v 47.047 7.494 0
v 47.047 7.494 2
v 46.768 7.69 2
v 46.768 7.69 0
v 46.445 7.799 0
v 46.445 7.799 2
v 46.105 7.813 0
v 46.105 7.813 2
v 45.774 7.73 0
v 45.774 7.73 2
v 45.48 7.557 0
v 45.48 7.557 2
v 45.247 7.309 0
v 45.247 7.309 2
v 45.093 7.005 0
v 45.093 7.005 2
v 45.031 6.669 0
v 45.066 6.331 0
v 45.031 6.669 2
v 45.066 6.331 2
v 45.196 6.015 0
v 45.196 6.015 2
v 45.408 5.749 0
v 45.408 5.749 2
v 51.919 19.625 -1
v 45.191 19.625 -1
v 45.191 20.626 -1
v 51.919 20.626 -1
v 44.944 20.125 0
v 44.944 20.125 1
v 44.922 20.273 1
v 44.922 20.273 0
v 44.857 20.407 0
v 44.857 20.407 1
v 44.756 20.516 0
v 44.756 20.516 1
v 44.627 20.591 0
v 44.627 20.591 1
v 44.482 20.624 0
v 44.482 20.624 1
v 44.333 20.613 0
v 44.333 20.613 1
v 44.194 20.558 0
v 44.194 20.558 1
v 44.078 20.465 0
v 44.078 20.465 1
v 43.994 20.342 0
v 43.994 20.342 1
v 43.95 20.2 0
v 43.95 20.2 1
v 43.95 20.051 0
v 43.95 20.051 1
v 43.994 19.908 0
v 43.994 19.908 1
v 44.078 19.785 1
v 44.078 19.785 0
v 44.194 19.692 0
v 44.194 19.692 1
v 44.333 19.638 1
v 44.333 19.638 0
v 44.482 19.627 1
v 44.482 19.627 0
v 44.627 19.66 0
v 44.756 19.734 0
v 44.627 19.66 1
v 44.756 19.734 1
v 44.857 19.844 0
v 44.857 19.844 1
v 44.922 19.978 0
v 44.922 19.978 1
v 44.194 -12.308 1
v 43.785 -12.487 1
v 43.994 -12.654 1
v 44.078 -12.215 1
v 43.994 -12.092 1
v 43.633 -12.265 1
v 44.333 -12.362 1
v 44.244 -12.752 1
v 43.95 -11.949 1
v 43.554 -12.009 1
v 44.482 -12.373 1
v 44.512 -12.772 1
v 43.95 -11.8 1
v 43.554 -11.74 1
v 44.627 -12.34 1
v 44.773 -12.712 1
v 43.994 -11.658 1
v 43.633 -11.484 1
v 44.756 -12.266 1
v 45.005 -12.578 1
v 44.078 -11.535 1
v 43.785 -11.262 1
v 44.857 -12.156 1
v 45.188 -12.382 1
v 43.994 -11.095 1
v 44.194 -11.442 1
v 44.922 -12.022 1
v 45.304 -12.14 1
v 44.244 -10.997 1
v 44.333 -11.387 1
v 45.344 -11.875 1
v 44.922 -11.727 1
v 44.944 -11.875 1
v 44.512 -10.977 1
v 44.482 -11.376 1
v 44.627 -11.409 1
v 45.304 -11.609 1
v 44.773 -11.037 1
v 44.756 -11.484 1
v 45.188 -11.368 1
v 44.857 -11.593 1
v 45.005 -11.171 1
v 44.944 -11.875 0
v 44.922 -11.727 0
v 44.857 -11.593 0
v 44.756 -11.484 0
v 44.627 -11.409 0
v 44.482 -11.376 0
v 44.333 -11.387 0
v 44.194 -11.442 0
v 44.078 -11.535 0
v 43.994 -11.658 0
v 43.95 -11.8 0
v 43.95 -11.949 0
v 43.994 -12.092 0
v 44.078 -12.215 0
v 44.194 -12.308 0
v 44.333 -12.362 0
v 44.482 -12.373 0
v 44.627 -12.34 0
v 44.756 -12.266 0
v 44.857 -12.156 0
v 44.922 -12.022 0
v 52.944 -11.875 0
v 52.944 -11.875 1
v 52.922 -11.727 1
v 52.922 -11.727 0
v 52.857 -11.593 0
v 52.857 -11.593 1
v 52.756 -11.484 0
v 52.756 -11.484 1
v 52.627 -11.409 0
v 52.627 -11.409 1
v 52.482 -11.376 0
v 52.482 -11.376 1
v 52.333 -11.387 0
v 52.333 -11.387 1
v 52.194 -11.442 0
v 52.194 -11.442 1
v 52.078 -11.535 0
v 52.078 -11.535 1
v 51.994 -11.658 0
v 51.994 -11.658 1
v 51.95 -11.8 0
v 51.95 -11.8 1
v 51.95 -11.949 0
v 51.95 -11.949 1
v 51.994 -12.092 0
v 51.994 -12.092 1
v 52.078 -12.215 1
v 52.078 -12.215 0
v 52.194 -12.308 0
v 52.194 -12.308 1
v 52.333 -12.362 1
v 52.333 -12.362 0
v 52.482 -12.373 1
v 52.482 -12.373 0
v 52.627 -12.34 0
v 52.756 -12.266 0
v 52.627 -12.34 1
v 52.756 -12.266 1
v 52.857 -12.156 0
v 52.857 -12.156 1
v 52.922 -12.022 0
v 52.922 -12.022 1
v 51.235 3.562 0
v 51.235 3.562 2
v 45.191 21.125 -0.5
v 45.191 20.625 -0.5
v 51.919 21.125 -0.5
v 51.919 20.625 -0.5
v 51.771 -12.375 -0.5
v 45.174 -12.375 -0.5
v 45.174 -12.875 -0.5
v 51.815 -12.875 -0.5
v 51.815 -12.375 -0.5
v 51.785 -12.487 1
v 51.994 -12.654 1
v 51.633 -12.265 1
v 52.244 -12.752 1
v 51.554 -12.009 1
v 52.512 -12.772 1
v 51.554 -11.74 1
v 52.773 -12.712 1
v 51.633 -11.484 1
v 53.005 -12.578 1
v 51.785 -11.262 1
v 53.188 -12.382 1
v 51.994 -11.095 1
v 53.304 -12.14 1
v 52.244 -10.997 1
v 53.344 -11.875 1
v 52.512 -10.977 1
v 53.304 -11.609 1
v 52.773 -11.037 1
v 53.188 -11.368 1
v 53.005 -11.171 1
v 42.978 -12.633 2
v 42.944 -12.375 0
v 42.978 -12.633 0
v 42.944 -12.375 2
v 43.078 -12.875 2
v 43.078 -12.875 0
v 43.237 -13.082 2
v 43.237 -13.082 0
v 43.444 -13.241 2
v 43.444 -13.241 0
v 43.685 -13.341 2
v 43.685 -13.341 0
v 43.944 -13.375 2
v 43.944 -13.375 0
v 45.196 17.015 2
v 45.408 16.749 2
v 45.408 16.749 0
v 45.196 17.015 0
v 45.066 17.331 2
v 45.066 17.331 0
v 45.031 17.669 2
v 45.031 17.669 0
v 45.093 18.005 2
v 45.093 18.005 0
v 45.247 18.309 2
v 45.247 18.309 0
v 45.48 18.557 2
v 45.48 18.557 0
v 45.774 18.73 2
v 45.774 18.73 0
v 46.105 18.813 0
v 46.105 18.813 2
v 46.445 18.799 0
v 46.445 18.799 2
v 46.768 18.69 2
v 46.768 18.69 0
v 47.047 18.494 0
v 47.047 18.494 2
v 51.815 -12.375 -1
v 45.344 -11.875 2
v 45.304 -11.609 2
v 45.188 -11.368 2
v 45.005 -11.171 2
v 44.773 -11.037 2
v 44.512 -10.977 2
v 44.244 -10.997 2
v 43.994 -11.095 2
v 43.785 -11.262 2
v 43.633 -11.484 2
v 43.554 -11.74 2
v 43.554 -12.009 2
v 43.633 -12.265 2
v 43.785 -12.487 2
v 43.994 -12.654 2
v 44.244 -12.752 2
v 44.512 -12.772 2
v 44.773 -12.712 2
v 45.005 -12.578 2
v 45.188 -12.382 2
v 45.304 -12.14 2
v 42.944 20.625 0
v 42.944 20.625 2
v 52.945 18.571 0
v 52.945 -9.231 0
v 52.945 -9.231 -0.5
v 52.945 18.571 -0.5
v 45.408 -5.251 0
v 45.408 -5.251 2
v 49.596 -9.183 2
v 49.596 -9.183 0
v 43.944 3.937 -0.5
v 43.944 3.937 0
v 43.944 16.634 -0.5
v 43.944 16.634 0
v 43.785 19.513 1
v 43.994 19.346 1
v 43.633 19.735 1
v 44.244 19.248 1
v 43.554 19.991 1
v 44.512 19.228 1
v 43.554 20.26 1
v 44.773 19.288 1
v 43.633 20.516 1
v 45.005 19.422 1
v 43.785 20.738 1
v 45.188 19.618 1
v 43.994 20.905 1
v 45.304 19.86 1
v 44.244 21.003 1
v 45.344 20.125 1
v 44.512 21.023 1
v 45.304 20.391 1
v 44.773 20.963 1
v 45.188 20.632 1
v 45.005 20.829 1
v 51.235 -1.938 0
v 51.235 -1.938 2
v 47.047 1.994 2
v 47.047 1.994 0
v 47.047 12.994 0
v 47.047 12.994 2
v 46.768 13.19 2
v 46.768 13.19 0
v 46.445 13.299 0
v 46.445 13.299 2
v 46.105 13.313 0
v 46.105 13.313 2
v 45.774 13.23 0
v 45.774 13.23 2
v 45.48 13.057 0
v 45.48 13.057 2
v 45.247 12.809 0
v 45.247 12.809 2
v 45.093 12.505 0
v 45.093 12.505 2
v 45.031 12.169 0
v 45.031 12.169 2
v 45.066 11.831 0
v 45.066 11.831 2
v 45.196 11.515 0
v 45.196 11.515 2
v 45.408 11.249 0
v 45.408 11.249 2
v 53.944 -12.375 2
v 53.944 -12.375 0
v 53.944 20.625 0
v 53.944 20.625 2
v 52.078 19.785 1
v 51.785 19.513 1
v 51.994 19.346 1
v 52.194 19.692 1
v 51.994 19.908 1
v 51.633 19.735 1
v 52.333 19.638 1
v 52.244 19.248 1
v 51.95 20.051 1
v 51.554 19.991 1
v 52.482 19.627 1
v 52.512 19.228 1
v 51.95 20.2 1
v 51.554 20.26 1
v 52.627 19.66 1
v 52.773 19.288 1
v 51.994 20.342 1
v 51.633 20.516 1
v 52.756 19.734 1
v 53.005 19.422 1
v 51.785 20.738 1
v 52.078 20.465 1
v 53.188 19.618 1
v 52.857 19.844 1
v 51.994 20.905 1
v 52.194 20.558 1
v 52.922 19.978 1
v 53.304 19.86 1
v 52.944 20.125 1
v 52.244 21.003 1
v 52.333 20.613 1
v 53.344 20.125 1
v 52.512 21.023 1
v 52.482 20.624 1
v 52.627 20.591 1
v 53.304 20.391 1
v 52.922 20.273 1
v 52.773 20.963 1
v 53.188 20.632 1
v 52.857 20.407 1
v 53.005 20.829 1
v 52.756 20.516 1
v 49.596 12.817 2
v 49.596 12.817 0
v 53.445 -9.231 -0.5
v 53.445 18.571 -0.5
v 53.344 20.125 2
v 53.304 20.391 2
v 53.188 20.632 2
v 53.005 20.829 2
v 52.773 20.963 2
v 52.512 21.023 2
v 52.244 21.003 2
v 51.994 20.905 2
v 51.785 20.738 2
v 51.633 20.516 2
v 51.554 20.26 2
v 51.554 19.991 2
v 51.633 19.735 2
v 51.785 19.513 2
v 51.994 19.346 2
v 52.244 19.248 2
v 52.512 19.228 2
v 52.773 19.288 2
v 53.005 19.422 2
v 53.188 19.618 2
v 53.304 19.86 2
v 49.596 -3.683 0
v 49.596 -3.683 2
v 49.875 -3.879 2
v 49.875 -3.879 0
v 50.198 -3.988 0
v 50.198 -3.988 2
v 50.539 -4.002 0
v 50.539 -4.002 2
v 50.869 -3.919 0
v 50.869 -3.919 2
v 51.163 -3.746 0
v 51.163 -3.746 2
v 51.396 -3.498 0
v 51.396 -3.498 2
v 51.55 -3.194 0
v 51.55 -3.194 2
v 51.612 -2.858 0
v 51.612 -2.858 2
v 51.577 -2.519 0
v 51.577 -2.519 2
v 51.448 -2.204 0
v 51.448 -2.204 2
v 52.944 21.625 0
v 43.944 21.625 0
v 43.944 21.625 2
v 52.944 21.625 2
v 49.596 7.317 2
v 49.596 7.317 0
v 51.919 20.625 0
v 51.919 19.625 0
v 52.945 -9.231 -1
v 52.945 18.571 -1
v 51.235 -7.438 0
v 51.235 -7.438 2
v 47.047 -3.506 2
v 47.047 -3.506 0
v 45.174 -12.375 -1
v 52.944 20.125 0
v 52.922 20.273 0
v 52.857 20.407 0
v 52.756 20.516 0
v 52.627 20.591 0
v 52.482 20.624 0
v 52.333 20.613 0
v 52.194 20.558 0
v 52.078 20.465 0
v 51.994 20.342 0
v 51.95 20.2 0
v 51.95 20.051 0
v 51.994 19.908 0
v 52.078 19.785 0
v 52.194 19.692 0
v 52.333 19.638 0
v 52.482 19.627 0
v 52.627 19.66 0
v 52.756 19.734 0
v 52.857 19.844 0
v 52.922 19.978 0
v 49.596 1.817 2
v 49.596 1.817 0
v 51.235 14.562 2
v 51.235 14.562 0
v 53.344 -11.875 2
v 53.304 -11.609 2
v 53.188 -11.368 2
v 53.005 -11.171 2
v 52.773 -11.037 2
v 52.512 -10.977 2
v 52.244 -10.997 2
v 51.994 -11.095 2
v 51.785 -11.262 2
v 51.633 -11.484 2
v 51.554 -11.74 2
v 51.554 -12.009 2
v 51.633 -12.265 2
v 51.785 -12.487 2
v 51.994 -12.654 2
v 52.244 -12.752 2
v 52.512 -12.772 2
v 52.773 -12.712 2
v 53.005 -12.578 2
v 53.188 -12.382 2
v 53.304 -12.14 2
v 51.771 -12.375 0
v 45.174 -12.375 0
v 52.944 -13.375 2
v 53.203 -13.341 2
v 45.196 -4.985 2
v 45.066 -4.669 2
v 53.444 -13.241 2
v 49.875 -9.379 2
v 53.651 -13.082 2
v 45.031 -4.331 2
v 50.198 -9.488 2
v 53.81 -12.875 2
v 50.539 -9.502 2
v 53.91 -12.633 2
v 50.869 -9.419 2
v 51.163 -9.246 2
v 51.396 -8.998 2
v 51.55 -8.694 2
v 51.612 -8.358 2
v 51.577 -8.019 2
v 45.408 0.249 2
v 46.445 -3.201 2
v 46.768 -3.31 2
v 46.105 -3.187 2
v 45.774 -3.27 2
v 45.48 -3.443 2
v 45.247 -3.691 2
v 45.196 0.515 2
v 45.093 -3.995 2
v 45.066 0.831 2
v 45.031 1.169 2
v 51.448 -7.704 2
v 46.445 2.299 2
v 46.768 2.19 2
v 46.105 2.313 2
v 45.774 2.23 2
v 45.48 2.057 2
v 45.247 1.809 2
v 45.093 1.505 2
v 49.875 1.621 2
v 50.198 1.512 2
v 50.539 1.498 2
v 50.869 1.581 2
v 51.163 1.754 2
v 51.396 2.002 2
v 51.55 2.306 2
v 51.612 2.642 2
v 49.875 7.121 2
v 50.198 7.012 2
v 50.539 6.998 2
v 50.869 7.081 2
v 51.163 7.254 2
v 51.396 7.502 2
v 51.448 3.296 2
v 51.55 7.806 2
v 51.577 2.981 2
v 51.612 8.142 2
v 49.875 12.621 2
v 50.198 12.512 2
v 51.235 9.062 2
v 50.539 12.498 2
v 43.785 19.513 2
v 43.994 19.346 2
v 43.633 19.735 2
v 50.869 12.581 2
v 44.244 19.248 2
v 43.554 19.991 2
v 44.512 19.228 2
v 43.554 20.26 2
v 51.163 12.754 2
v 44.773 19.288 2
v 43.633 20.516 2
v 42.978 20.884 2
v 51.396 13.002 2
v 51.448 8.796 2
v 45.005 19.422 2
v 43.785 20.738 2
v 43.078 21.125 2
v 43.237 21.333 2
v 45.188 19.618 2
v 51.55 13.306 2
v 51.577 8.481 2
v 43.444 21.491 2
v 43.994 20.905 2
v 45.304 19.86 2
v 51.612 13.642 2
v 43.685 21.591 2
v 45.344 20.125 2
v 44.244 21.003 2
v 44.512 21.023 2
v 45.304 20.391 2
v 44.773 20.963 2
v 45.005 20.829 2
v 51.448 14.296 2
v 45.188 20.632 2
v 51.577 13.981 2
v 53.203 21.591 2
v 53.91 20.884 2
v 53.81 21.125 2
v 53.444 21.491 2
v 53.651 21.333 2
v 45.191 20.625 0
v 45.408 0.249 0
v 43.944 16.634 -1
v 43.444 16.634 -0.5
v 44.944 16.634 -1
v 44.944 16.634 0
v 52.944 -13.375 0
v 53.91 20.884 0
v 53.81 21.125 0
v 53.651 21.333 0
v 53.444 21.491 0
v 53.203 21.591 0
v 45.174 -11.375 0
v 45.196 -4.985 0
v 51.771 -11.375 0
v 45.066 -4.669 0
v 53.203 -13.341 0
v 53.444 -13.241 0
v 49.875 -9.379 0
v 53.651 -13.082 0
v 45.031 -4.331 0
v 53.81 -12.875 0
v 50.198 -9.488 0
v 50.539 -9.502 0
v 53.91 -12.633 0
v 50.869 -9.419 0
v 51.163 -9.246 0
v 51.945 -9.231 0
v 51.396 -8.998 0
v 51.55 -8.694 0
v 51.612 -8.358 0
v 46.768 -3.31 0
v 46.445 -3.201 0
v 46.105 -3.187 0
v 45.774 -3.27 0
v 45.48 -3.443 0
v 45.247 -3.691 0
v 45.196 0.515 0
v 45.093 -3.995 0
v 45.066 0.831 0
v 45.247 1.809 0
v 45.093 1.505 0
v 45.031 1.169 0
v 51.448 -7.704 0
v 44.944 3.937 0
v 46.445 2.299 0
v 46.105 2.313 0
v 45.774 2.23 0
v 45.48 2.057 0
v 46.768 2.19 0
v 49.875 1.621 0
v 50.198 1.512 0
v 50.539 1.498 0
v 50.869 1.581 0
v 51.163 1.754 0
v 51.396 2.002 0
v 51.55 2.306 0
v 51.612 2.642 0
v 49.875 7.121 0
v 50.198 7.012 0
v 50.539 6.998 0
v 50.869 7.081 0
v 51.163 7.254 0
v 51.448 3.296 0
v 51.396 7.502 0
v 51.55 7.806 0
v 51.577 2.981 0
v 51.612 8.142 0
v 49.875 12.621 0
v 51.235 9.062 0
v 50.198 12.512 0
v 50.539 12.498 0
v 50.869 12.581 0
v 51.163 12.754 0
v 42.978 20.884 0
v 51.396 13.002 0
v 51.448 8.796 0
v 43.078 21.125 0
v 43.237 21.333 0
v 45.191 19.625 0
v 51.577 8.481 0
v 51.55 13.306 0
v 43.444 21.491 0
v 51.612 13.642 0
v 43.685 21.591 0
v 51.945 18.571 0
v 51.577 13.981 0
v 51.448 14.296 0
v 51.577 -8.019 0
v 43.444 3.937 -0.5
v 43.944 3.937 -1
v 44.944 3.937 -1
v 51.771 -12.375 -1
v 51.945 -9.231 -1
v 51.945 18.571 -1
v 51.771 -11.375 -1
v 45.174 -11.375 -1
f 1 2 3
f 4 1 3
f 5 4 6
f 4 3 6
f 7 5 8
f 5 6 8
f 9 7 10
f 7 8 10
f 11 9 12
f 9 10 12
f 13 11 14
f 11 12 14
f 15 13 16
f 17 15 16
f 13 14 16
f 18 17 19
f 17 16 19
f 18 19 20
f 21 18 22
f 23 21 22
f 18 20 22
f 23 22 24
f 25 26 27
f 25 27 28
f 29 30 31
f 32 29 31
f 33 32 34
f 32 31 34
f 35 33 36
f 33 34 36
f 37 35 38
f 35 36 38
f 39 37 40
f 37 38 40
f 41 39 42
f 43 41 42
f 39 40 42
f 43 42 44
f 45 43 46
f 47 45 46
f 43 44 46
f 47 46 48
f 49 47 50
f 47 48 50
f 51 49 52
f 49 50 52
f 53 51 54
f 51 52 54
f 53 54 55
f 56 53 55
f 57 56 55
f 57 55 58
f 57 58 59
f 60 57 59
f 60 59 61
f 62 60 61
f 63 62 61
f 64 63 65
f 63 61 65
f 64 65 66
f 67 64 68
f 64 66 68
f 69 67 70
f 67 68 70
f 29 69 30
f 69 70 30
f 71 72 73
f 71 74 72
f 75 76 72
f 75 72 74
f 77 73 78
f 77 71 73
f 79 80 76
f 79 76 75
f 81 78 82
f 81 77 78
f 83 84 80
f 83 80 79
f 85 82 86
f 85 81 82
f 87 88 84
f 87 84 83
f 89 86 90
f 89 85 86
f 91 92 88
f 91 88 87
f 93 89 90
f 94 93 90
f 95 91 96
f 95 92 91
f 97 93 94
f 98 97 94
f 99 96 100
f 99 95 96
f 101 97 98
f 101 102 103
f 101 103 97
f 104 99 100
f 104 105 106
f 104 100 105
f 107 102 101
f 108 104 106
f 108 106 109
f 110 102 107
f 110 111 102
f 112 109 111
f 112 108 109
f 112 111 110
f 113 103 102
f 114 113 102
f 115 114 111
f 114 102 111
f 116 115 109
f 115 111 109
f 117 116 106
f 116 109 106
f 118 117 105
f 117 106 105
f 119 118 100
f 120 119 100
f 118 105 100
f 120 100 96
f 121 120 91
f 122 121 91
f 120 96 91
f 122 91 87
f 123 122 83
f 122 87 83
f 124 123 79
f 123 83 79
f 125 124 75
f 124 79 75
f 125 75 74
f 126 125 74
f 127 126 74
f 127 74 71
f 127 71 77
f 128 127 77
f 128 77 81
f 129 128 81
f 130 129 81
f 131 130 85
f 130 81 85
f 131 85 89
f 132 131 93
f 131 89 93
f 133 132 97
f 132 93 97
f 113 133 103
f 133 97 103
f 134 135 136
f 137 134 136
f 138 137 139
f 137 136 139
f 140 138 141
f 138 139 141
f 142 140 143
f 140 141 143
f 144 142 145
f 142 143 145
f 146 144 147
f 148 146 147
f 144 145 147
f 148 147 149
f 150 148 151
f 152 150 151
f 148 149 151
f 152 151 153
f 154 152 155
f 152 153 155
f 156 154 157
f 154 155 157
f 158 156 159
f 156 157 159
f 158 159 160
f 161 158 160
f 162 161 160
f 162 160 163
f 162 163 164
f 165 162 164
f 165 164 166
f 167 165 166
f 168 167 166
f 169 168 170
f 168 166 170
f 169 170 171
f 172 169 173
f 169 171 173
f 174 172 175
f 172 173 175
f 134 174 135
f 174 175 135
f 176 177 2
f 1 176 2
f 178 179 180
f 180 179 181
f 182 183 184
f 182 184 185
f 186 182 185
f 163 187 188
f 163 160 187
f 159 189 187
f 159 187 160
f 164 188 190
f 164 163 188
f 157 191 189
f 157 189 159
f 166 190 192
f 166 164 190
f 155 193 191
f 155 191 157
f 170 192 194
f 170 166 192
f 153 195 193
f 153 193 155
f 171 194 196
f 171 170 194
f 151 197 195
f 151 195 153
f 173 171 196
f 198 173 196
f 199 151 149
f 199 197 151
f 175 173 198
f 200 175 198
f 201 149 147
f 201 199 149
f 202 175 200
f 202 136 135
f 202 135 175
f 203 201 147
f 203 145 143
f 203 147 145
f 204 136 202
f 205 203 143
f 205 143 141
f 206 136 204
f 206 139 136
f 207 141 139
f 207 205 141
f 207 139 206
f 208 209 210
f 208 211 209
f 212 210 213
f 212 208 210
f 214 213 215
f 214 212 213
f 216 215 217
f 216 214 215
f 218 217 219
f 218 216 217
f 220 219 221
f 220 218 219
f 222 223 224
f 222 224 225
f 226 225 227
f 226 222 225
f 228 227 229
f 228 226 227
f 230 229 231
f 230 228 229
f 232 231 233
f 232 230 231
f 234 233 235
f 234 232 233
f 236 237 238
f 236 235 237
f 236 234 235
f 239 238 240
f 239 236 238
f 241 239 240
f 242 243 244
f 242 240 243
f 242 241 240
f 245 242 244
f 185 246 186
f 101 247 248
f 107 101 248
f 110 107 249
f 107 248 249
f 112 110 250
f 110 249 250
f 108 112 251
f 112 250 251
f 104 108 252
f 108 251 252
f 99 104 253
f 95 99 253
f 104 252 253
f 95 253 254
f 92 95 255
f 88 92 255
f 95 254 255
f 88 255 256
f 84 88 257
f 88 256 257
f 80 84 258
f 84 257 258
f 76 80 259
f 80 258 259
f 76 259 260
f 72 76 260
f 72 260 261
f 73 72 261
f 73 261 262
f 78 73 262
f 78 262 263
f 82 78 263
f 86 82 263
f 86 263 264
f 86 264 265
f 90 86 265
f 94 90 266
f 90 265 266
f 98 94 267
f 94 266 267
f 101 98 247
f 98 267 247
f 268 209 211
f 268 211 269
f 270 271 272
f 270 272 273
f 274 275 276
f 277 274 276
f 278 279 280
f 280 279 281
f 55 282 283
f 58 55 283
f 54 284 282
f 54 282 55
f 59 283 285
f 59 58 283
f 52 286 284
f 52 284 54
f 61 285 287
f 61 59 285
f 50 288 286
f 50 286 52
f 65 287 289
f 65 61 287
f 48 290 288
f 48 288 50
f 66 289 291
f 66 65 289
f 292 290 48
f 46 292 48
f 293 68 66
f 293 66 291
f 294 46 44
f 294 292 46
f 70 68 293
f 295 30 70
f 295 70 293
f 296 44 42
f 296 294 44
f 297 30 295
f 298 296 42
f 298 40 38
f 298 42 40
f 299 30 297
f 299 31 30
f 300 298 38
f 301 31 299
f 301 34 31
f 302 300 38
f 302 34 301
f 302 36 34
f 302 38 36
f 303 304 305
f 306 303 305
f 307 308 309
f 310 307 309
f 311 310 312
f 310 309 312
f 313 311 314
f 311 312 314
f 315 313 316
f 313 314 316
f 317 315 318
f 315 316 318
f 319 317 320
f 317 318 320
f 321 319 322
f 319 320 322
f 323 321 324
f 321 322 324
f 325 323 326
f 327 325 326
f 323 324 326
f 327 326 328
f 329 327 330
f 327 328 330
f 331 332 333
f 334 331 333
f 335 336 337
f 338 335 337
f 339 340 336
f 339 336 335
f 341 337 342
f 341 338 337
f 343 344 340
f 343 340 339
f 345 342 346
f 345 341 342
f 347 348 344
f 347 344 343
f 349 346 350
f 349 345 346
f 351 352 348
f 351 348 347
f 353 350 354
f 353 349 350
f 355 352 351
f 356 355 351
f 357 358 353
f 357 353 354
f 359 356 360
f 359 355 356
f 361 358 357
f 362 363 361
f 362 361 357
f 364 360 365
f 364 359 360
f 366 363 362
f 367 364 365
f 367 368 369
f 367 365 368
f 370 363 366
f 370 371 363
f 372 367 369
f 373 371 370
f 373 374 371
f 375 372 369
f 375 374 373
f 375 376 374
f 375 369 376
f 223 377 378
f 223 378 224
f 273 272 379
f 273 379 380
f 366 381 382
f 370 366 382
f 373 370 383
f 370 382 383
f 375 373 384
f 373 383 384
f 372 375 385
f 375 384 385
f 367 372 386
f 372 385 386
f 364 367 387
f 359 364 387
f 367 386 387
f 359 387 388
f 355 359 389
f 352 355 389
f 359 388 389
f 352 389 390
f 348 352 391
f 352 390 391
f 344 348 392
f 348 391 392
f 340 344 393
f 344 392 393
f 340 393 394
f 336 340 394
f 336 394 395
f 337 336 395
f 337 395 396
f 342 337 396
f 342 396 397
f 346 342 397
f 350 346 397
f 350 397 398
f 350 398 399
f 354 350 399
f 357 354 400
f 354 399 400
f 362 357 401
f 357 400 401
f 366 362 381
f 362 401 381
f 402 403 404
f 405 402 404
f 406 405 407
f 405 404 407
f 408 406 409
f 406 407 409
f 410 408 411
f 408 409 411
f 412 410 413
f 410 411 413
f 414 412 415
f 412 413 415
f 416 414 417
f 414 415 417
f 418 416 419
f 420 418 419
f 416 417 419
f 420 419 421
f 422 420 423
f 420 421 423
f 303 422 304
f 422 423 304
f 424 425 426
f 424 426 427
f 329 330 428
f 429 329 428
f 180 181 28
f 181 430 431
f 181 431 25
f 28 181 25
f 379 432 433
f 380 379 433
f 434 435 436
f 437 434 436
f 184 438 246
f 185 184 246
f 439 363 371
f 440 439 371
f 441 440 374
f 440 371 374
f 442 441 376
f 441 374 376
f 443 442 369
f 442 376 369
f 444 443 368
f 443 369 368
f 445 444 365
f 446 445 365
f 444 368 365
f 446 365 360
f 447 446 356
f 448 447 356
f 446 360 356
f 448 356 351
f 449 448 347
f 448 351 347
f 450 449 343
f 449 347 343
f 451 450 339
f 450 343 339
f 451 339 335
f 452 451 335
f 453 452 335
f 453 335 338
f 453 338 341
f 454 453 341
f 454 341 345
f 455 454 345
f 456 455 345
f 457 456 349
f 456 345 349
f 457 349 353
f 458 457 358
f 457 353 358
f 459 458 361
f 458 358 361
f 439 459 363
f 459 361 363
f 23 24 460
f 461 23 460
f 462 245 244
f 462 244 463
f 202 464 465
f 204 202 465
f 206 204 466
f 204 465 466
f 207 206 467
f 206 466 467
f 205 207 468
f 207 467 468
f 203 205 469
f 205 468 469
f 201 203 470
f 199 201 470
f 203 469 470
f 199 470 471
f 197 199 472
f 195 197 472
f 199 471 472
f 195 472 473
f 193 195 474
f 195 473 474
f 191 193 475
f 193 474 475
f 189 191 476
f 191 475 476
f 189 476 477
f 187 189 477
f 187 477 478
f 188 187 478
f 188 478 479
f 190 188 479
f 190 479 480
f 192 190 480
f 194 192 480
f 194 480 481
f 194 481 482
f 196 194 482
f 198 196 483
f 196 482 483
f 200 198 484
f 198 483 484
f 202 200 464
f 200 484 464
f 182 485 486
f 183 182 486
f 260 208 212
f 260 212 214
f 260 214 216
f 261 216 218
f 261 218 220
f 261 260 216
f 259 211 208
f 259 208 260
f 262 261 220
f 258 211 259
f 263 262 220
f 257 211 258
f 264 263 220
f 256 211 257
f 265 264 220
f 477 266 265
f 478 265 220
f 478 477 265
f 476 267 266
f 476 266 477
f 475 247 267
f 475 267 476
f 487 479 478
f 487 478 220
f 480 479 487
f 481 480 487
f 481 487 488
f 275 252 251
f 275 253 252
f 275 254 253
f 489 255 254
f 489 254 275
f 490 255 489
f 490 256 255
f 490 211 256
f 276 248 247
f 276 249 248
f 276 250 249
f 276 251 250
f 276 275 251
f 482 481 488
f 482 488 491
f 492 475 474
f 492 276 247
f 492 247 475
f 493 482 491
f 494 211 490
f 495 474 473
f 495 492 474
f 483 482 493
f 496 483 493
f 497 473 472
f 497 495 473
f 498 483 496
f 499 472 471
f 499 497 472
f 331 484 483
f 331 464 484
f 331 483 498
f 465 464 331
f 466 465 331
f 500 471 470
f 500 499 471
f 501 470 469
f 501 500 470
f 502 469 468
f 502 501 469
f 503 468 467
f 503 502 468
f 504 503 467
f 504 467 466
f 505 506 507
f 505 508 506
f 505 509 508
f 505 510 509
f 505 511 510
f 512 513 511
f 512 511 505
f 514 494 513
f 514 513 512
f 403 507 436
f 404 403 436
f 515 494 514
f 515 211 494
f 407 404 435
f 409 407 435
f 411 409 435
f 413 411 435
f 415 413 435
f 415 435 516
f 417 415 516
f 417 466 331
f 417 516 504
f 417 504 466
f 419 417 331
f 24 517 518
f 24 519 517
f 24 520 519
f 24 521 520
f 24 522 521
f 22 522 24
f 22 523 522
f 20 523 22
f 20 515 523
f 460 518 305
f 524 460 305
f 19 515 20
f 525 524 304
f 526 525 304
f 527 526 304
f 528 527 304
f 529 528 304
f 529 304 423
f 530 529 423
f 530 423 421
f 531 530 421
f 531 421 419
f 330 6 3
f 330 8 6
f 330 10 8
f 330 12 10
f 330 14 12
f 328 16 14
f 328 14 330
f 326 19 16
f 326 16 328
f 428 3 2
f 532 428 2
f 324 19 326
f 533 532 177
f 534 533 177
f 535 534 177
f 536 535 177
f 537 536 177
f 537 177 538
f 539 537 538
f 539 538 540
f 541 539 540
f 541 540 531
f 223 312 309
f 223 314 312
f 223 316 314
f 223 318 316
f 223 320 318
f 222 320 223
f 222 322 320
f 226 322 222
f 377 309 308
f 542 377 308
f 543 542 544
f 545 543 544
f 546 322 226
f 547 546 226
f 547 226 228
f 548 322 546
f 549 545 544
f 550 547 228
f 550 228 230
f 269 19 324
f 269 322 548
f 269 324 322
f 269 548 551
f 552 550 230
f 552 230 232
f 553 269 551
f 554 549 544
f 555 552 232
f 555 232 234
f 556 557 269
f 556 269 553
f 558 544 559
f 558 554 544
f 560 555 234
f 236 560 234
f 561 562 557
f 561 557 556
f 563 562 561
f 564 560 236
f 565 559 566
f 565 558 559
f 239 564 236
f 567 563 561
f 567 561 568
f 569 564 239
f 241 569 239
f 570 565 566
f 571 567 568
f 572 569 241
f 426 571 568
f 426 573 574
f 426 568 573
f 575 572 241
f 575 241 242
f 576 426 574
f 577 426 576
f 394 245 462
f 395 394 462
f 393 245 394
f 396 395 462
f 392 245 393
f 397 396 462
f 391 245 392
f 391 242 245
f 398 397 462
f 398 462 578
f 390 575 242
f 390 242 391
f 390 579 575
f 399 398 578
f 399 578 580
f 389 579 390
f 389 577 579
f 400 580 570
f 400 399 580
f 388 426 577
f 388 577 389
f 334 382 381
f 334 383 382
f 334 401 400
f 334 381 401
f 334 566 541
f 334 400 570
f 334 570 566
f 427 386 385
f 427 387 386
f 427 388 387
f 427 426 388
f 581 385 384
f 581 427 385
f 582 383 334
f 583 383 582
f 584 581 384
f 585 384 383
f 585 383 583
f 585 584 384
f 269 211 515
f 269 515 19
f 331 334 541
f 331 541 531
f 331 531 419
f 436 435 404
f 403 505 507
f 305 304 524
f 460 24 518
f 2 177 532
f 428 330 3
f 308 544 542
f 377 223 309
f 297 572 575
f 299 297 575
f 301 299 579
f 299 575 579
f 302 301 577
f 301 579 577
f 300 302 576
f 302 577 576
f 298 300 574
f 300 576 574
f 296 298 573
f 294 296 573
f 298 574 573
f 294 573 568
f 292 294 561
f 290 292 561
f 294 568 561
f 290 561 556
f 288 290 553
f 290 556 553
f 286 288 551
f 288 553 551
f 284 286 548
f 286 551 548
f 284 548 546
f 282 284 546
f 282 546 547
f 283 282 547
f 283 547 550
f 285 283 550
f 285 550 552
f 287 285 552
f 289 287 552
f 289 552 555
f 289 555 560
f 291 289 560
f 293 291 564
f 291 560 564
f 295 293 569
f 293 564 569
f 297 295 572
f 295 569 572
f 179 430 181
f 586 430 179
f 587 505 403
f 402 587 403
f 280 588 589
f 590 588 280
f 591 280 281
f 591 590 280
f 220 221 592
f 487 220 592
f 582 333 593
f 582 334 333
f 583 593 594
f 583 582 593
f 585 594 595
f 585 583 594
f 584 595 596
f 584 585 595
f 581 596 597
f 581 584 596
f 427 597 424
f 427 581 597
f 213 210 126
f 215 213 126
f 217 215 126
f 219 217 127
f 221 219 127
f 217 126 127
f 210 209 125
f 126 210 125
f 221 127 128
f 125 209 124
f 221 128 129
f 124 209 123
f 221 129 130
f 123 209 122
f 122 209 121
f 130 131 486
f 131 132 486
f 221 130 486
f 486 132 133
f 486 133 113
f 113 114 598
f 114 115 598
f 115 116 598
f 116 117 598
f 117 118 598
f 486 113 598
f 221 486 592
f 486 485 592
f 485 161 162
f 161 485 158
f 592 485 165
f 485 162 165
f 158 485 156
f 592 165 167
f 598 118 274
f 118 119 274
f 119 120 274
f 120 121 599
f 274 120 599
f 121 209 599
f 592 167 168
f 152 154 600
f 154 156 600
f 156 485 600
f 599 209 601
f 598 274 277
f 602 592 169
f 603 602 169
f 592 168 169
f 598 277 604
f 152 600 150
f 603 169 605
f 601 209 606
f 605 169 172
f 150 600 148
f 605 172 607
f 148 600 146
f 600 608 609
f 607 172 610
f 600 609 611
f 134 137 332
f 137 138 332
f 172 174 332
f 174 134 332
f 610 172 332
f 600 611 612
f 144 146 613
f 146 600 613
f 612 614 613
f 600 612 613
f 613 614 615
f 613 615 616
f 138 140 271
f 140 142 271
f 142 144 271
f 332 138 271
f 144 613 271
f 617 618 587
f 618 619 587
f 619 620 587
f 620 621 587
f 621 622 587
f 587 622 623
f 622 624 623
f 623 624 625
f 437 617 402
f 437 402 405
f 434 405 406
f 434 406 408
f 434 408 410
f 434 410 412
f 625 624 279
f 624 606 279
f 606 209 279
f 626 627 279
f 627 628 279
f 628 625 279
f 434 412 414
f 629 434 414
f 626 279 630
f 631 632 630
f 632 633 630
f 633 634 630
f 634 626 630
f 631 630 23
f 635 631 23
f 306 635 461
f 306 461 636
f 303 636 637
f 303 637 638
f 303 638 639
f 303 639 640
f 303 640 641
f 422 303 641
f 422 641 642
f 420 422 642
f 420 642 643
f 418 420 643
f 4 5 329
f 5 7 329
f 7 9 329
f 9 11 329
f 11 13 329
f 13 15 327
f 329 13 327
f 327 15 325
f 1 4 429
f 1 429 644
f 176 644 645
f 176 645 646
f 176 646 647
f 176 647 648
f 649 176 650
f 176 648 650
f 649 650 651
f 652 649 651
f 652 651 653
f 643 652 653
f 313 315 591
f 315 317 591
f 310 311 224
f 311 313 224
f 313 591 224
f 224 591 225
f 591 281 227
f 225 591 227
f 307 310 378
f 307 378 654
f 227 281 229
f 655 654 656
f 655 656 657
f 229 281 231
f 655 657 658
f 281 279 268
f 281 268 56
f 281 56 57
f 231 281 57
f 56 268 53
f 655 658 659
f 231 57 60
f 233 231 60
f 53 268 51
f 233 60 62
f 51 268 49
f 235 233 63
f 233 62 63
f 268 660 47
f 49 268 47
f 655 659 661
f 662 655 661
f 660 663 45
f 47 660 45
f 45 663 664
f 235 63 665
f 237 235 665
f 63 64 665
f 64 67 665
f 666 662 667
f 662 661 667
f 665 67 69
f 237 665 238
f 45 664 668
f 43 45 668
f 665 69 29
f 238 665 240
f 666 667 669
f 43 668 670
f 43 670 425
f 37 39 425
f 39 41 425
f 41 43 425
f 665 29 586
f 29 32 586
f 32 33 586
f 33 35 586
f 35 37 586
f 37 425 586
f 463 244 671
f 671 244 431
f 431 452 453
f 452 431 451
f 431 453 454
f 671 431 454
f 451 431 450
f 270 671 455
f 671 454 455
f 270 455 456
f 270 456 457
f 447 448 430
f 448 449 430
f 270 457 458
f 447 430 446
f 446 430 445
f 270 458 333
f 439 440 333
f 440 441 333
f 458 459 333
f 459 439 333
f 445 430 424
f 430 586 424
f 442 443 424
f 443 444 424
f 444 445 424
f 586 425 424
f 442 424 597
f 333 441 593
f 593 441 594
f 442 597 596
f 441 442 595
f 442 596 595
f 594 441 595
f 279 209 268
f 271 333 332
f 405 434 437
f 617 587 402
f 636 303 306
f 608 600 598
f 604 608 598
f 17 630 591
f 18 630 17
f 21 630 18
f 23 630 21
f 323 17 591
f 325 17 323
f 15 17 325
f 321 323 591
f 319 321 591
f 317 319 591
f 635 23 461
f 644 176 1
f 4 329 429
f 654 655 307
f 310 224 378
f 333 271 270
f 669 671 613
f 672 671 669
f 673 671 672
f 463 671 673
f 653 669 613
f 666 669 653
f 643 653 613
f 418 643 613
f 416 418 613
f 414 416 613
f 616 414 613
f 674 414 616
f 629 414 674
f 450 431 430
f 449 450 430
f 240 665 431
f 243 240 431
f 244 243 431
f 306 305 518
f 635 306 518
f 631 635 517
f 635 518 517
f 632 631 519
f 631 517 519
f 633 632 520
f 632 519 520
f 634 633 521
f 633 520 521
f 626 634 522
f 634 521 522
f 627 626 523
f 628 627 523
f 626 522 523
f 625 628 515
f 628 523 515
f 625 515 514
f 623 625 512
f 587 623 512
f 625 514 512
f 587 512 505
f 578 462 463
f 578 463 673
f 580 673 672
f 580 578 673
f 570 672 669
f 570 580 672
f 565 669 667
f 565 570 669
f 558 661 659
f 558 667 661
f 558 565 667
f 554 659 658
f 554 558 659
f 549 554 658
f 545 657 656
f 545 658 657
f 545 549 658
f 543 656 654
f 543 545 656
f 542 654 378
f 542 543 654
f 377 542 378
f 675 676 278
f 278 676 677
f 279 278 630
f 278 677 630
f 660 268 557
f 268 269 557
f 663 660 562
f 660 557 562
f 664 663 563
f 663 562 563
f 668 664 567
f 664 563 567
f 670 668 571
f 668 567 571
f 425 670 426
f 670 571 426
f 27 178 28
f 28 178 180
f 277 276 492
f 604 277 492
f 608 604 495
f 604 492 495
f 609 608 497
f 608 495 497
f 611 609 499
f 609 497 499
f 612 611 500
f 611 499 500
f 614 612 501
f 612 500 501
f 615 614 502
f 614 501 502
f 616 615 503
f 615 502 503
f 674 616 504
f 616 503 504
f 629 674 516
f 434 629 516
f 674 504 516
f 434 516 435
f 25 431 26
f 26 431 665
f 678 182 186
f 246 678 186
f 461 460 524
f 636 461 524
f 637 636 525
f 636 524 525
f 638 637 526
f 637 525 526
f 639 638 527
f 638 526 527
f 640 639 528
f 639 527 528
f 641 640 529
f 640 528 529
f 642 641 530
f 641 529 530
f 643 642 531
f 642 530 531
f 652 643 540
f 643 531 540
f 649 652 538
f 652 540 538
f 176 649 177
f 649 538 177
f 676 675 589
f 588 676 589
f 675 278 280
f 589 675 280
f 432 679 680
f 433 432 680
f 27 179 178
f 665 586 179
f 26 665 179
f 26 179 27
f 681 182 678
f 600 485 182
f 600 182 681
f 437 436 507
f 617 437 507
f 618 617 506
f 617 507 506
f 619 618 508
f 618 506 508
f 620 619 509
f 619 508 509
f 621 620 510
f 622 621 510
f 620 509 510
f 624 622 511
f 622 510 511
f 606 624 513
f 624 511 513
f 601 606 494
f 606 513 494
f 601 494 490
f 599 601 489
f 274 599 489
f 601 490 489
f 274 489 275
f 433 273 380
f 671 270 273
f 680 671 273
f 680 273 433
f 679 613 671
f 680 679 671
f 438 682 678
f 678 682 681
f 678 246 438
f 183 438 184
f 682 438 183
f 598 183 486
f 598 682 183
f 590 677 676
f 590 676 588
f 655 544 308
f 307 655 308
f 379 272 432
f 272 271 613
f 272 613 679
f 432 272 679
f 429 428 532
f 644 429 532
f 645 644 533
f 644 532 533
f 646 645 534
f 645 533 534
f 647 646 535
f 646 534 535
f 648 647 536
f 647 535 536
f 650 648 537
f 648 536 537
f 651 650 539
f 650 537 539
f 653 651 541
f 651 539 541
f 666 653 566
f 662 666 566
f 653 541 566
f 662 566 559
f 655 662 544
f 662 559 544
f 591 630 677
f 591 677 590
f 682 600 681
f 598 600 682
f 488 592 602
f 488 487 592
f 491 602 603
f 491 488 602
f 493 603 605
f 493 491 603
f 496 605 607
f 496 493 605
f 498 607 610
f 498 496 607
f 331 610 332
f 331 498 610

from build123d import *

# Parameters (mm, degrees)
SKETCH_1_W          = 11
SKETCH_1_H          = 35
EXTRUDE_1_DEPTH     = 2
FILLET_1_R          = 1
SKETCH_2_W          = 1
SKETCH_2_H          = 27.801195883
SKETCH_2_H_2        = 12.696804569
SKETCH_2_W_2        = 6.728012357
SKETCH_2_H_3        = 1
SKETCH_2_W_3        = 6.596948746
EXTRUDE_2_DEPTH     = 1
SKETCH_3_W          = 6.641337803
SKETCH_3_H          = 0.5
EXTRUDE_3_DEPTH     = 0.5
SKETCH_4_W          = 0.5
SKETCH_4_H          = 12.696804569
EXTRUDE_4_DEPTH     = 0.5
SKETCH_5_W          = 6.728012357
SKETCH_5_H          = 0.5
EXTRUDE_5_DEPTH     = 0.5
SKETCH_6_W          = 0.5
SKETCH_6_H          = 27.801195883
EXTRUDE_6_DEPTH     = 0.5
CHAMFER_1_SIZE      = 0.5
CUT_EXTRUDE_1_REACH = 60.195
SKETCH_8_R          = 0.9
CUT_EXTRUDE_2_DEPTH = 1
SKETCH_9_R          = 0.5
CUT_EXTRUDE_3_DEPTH = 1


with BuildPart() as part:
    # 草图1 → 凸台-拉伸1 (new body)
    with BuildSketch(Plane.XY):
        with Locations((48.44429715, 4.125412508)):
            Rectangle(SKETCH_1_W, SKETCH_1_H)
    extrude(amount=EXTRUDE_1_DEPTH)

    # 圆角1
    fillet_1_edges = [part.edges().sort_by_distance(p)[0] for p in [
        (42.94429715, 21.625412508, 1),
        (53.94429715, 21.625412508, 1),
        (53.94429715, -13.374587492, 1),
        (42.94429715, -13.374587492, 1),
    ]]
    fillet(fillet_1_edges, radius=FILLET_1_R)

    # 草图2 → 凸台-拉伸2 (add)
    with BuildSketch(Plane(origin=(0, 0, 0), x_dir=(-1, 0, 0), z_dir=(0, 0, -1))):
        with Locations((-52.444918102, 4.669937054)):
            Rectangle(SKETCH_2_W, SKETCH_2_H)
        with Locations((-44.44429715, 10.285527485)):
            Rectangle(SKETCH_2_W, SKETCH_2_H_2)
        with Locations((-48.555014421, 20.125412508)):
            Rectangle(SKETCH_2_W_2, SKETCH_2_H_3)
        with Locations((-48.47250239, -11.874587492)):
            Rectangle(SKETCH_2_W_3, SKETCH_2_H_3)
    extrude(amount=EXTRUDE_2_DEPTH)

    # 草图3 → 凸台-拉伸3 (add)
    with BuildSketch(Plane.XZ.offset(12.374587492)):
        with Locations((48.494696919, -0.75)):
            Rectangle(SKETCH_3_W, SKETCH_3_H)
    extrude(amount=EXTRUDE_3_DEPTH)

    # 草图4 → 凸台-拉伸4 (add)
    with BuildSketch(Plane.ZY.offset(-43.94429715)):
        with Locations((-0.75, 10.285527485)):
            Rectangle(SKETCH_4_W, SKETCH_4_H)
    extrude(amount=EXTRUDE_4_DEPTH)

    # 草图5 → 凸台-拉伸5 (add)
    with BuildSketch(Plane(origin=(0, 20.625412508, 0), x_dir=(1, 0, 0), z_dir=(0, 1, 0))):
        with Locations((48.555014421, 0.75)):
            Rectangle(SKETCH_5_W, SKETCH_5_H)
    extrude(amount=EXTRUDE_5_DEPTH)

    # 草图6 → 凸台-拉伸6 (add)
    with BuildSketch(Plane(origin=(52.944918102, 0, 0), x_dir=(0, 0, -1), z_dir=(1, 0, 0))):
        with Locations((0.75, 4.669937054)):
            Rectangle(SKETCH_6_W, SKETCH_6_H)
    extrude(amount=EXTRUDE_6_DEPTH)

    # 倒角1
    chamfer_1_edges = [part.edges().sort_by_distance(p)[0] for p in [
        (48.494696919, -12.874587492, -1),
        (53.444918102, 4.669937054, -1),
        (48.555014421, 21.125412508, -1),
        (43.44429715, 10.285527485, -1),
    ]]
    chamfer(chamfer_1_edges, length=CHAMFER_1_SIZE - 0.0001)  # a hair under: the kernel refuses the full size

    # 草图7 → 切除-拉伸1 (cut, up to next)
    with BuildSketch(Plane.XY.offset(2), mode=Mode.PRIVATE) as cut_extrude_1_sk1:
        with BuildLine():
            Line((47.04721821, 18.494490282), (51.235350906, 14.562121415))
            ThreePointArc((51.235350906, 14.562121415), (51.288650219, 12.86986824), (49.596397044, 12.816568927))
            Line((49.596397044, 12.816568927), (45.408264348, 16.748937794))
            ThreePointArc((45.408264348, 16.748937794), (45.354965035, 18.441190969), (47.04721821, 18.494490282))
        make_face()
    cut_extrude_1_tool1 = extrude(cut_extrude_1_sk1.sketch, amount=-CUT_EXTRUDE_1_REACH, mode=Mode.PRIVATE) & part.part
    # 草图7 → 切除-拉伸1 (cut, up to next)
    with BuildSketch(Plane.XY.offset(2), mode=Mode.PRIVATE) as cut_extrude_1_sk2:
        with BuildLine():
            Line((45.408264348, 11.248937794), (49.596397044, 7.316568927))
            ThreePointArc((49.596397044, 7.316568927), (51.288650219, 7.36986824), (51.235350906, 9.062121415))
            Line((51.235350906, 9.062121415), (47.04721821, 12.994490282))
            ThreePointArc((47.04721821, 12.994490282), (45.354965035, 12.941190969), (45.408264348, 11.248937794))
        make_face()
    cut_extrude_1_tool2 = extrude(cut_extrude_1_sk2.sketch, amount=-CUT_EXTRUDE_1_REACH, mode=Mode.PRIVATE) & part.part
    # 草图7 → 切除-拉伸1 (cut, up to next)
    with BuildSketch(Plane.XY.offset(2), mode=Mode.PRIVATE) as cut_extrude_1_sk3:
        with BuildLine():
            Line((45.408264348, 5.748937794), (49.596397044, 1.816568927))
            ThreePointArc((49.596397044, 1.816568927), (51.288650219, 1.86986824), (51.235350906, 3.562121415))
            Line((51.235350906, 3.562121415), (47.04721821, 7.494490282))
            ThreePointArc((47.04721821, 7.494490282), (45.354965035, 7.441190969), (45.408264348, 5.748937794))
        make_face()
    cut_extrude_1_tool3 = extrude(cut_extrude_1_sk3.sketch, amount=-CUT_EXTRUDE_1_REACH, mode=Mode.PRIVATE) & part.part
    # 草图7 → 切除-拉伸1 (cut, up to next)
    with BuildSketch(Plane.XY.offset(2), mode=Mode.PRIVATE) as cut_extrude_1_sk4:
        with BuildLine():
            Line((45.408264348, 0.248937794), (49.596397044, -3.683431073))
            ThreePointArc((49.596397044, -3.683431073), (51.288650219, -3.63013176), (51.235350906, -1.937878585))
            Line((51.235350906, -1.937878585), (47.04721821, 1.994490282))
            ThreePointArc((47.04721821, 1.994490282), (45.354965035, 1.941190969), (45.408264348, 0.248937794))
        make_face()
    cut_extrude_1_tool4 = extrude(cut_extrude_1_sk4.sketch, amount=-CUT_EXTRUDE_1_REACH, mode=Mode.PRIVATE) & part.part
    # 草图7 → 切除-拉伸1 (cut, up to next)
    with BuildSketch(Plane.XY.offset(2), mode=Mode.PRIVATE) as cut_extrude_1_sk5:
        with BuildLine():
            Line((45.408264348, -5.251062206), (49.596397044, -9.183431073))
            ThreePointArc((49.596397044, -9.183431073), (51.288650219, -9.13013176), (51.235350906, -7.437878585))
            Line((51.235350906, -7.437878585), (47.04721821, -3.505509718))
            ThreePointArc((47.04721821, -3.505509718), (45.354965035, -3.558809031), (45.408264348, -5.251062206))
        make_face()
    cut_extrude_1_tool5 = extrude(cut_extrude_1_sk5.sketch, amount=-CUT_EXTRUDE_1_REACH, mode=Mode.PRIVATE) & part.part
    add(cut_extrude_1_tool1.solids().sort_by_distance((48.321808, 15.65553, 2))[0], mode=Mode.SUBTRACT)
    add(cut_extrude_1_tool2.solids().sort_by_distance((48.321808, 10.15553, 2))[0], mode=Mode.SUBTRACT)
    add(cut_extrude_1_tool3.solids().sort_by_distance((48.321808, 4.65553, 2))[0], mode=Mode.SUBTRACT)
    add(cut_extrude_1_tool4.solids().sort_by_distance((48.321808, -0.84447, 2))[0], mode=Mode.SUBTRACT)
    add(cut_extrude_1_tool5.solids().sort_by_distance((48.321808, -6.34447, 2))[0], mode=Mode.SUBTRACT)

    # 草图8 → 切除-拉伸2 (cut)
    with BuildSketch(Plane.XY.offset(2)):
        with Locations((44.44429715, 20.125412508)):
            Circle(SKETCH_8_R)
        with Locations((52.44429715, 20.125412508)):
            Circle(SKETCH_8_R)
        with Locations((44.44429715, -11.874587492)):
            Circle(SKETCH_8_R)
        with Locations((52.44429715, -11.874587492)):
            Circle(SKETCH_8_R)
    extrude(amount=-CUT_EXTRUDE_2_DEPTH, mode=Mode.SUBTRACT)

    # 草图9 → 切除-拉伸3 (cut)
    with BuildSketch(Plane.XY.offset(1)):
        with Locations((44.44429715, 20.125412508)):
            Circle(SKETCH_9_R)
        with Locations((52.44429715, 20.125412508)):
            Circle(SKETCH_9_R)
        with Locations((52.44429715, -11.874587492)):
            Circle(SKETCH_9_R)
        with Locations((44.44429715, -11.874587492)):
            Circle(SKETCH_9_R)
    extrude(amount=-CUT_EXTRUDE_3_DEPTH, mode=Mode.SUBTRACT)


solid = part.part
